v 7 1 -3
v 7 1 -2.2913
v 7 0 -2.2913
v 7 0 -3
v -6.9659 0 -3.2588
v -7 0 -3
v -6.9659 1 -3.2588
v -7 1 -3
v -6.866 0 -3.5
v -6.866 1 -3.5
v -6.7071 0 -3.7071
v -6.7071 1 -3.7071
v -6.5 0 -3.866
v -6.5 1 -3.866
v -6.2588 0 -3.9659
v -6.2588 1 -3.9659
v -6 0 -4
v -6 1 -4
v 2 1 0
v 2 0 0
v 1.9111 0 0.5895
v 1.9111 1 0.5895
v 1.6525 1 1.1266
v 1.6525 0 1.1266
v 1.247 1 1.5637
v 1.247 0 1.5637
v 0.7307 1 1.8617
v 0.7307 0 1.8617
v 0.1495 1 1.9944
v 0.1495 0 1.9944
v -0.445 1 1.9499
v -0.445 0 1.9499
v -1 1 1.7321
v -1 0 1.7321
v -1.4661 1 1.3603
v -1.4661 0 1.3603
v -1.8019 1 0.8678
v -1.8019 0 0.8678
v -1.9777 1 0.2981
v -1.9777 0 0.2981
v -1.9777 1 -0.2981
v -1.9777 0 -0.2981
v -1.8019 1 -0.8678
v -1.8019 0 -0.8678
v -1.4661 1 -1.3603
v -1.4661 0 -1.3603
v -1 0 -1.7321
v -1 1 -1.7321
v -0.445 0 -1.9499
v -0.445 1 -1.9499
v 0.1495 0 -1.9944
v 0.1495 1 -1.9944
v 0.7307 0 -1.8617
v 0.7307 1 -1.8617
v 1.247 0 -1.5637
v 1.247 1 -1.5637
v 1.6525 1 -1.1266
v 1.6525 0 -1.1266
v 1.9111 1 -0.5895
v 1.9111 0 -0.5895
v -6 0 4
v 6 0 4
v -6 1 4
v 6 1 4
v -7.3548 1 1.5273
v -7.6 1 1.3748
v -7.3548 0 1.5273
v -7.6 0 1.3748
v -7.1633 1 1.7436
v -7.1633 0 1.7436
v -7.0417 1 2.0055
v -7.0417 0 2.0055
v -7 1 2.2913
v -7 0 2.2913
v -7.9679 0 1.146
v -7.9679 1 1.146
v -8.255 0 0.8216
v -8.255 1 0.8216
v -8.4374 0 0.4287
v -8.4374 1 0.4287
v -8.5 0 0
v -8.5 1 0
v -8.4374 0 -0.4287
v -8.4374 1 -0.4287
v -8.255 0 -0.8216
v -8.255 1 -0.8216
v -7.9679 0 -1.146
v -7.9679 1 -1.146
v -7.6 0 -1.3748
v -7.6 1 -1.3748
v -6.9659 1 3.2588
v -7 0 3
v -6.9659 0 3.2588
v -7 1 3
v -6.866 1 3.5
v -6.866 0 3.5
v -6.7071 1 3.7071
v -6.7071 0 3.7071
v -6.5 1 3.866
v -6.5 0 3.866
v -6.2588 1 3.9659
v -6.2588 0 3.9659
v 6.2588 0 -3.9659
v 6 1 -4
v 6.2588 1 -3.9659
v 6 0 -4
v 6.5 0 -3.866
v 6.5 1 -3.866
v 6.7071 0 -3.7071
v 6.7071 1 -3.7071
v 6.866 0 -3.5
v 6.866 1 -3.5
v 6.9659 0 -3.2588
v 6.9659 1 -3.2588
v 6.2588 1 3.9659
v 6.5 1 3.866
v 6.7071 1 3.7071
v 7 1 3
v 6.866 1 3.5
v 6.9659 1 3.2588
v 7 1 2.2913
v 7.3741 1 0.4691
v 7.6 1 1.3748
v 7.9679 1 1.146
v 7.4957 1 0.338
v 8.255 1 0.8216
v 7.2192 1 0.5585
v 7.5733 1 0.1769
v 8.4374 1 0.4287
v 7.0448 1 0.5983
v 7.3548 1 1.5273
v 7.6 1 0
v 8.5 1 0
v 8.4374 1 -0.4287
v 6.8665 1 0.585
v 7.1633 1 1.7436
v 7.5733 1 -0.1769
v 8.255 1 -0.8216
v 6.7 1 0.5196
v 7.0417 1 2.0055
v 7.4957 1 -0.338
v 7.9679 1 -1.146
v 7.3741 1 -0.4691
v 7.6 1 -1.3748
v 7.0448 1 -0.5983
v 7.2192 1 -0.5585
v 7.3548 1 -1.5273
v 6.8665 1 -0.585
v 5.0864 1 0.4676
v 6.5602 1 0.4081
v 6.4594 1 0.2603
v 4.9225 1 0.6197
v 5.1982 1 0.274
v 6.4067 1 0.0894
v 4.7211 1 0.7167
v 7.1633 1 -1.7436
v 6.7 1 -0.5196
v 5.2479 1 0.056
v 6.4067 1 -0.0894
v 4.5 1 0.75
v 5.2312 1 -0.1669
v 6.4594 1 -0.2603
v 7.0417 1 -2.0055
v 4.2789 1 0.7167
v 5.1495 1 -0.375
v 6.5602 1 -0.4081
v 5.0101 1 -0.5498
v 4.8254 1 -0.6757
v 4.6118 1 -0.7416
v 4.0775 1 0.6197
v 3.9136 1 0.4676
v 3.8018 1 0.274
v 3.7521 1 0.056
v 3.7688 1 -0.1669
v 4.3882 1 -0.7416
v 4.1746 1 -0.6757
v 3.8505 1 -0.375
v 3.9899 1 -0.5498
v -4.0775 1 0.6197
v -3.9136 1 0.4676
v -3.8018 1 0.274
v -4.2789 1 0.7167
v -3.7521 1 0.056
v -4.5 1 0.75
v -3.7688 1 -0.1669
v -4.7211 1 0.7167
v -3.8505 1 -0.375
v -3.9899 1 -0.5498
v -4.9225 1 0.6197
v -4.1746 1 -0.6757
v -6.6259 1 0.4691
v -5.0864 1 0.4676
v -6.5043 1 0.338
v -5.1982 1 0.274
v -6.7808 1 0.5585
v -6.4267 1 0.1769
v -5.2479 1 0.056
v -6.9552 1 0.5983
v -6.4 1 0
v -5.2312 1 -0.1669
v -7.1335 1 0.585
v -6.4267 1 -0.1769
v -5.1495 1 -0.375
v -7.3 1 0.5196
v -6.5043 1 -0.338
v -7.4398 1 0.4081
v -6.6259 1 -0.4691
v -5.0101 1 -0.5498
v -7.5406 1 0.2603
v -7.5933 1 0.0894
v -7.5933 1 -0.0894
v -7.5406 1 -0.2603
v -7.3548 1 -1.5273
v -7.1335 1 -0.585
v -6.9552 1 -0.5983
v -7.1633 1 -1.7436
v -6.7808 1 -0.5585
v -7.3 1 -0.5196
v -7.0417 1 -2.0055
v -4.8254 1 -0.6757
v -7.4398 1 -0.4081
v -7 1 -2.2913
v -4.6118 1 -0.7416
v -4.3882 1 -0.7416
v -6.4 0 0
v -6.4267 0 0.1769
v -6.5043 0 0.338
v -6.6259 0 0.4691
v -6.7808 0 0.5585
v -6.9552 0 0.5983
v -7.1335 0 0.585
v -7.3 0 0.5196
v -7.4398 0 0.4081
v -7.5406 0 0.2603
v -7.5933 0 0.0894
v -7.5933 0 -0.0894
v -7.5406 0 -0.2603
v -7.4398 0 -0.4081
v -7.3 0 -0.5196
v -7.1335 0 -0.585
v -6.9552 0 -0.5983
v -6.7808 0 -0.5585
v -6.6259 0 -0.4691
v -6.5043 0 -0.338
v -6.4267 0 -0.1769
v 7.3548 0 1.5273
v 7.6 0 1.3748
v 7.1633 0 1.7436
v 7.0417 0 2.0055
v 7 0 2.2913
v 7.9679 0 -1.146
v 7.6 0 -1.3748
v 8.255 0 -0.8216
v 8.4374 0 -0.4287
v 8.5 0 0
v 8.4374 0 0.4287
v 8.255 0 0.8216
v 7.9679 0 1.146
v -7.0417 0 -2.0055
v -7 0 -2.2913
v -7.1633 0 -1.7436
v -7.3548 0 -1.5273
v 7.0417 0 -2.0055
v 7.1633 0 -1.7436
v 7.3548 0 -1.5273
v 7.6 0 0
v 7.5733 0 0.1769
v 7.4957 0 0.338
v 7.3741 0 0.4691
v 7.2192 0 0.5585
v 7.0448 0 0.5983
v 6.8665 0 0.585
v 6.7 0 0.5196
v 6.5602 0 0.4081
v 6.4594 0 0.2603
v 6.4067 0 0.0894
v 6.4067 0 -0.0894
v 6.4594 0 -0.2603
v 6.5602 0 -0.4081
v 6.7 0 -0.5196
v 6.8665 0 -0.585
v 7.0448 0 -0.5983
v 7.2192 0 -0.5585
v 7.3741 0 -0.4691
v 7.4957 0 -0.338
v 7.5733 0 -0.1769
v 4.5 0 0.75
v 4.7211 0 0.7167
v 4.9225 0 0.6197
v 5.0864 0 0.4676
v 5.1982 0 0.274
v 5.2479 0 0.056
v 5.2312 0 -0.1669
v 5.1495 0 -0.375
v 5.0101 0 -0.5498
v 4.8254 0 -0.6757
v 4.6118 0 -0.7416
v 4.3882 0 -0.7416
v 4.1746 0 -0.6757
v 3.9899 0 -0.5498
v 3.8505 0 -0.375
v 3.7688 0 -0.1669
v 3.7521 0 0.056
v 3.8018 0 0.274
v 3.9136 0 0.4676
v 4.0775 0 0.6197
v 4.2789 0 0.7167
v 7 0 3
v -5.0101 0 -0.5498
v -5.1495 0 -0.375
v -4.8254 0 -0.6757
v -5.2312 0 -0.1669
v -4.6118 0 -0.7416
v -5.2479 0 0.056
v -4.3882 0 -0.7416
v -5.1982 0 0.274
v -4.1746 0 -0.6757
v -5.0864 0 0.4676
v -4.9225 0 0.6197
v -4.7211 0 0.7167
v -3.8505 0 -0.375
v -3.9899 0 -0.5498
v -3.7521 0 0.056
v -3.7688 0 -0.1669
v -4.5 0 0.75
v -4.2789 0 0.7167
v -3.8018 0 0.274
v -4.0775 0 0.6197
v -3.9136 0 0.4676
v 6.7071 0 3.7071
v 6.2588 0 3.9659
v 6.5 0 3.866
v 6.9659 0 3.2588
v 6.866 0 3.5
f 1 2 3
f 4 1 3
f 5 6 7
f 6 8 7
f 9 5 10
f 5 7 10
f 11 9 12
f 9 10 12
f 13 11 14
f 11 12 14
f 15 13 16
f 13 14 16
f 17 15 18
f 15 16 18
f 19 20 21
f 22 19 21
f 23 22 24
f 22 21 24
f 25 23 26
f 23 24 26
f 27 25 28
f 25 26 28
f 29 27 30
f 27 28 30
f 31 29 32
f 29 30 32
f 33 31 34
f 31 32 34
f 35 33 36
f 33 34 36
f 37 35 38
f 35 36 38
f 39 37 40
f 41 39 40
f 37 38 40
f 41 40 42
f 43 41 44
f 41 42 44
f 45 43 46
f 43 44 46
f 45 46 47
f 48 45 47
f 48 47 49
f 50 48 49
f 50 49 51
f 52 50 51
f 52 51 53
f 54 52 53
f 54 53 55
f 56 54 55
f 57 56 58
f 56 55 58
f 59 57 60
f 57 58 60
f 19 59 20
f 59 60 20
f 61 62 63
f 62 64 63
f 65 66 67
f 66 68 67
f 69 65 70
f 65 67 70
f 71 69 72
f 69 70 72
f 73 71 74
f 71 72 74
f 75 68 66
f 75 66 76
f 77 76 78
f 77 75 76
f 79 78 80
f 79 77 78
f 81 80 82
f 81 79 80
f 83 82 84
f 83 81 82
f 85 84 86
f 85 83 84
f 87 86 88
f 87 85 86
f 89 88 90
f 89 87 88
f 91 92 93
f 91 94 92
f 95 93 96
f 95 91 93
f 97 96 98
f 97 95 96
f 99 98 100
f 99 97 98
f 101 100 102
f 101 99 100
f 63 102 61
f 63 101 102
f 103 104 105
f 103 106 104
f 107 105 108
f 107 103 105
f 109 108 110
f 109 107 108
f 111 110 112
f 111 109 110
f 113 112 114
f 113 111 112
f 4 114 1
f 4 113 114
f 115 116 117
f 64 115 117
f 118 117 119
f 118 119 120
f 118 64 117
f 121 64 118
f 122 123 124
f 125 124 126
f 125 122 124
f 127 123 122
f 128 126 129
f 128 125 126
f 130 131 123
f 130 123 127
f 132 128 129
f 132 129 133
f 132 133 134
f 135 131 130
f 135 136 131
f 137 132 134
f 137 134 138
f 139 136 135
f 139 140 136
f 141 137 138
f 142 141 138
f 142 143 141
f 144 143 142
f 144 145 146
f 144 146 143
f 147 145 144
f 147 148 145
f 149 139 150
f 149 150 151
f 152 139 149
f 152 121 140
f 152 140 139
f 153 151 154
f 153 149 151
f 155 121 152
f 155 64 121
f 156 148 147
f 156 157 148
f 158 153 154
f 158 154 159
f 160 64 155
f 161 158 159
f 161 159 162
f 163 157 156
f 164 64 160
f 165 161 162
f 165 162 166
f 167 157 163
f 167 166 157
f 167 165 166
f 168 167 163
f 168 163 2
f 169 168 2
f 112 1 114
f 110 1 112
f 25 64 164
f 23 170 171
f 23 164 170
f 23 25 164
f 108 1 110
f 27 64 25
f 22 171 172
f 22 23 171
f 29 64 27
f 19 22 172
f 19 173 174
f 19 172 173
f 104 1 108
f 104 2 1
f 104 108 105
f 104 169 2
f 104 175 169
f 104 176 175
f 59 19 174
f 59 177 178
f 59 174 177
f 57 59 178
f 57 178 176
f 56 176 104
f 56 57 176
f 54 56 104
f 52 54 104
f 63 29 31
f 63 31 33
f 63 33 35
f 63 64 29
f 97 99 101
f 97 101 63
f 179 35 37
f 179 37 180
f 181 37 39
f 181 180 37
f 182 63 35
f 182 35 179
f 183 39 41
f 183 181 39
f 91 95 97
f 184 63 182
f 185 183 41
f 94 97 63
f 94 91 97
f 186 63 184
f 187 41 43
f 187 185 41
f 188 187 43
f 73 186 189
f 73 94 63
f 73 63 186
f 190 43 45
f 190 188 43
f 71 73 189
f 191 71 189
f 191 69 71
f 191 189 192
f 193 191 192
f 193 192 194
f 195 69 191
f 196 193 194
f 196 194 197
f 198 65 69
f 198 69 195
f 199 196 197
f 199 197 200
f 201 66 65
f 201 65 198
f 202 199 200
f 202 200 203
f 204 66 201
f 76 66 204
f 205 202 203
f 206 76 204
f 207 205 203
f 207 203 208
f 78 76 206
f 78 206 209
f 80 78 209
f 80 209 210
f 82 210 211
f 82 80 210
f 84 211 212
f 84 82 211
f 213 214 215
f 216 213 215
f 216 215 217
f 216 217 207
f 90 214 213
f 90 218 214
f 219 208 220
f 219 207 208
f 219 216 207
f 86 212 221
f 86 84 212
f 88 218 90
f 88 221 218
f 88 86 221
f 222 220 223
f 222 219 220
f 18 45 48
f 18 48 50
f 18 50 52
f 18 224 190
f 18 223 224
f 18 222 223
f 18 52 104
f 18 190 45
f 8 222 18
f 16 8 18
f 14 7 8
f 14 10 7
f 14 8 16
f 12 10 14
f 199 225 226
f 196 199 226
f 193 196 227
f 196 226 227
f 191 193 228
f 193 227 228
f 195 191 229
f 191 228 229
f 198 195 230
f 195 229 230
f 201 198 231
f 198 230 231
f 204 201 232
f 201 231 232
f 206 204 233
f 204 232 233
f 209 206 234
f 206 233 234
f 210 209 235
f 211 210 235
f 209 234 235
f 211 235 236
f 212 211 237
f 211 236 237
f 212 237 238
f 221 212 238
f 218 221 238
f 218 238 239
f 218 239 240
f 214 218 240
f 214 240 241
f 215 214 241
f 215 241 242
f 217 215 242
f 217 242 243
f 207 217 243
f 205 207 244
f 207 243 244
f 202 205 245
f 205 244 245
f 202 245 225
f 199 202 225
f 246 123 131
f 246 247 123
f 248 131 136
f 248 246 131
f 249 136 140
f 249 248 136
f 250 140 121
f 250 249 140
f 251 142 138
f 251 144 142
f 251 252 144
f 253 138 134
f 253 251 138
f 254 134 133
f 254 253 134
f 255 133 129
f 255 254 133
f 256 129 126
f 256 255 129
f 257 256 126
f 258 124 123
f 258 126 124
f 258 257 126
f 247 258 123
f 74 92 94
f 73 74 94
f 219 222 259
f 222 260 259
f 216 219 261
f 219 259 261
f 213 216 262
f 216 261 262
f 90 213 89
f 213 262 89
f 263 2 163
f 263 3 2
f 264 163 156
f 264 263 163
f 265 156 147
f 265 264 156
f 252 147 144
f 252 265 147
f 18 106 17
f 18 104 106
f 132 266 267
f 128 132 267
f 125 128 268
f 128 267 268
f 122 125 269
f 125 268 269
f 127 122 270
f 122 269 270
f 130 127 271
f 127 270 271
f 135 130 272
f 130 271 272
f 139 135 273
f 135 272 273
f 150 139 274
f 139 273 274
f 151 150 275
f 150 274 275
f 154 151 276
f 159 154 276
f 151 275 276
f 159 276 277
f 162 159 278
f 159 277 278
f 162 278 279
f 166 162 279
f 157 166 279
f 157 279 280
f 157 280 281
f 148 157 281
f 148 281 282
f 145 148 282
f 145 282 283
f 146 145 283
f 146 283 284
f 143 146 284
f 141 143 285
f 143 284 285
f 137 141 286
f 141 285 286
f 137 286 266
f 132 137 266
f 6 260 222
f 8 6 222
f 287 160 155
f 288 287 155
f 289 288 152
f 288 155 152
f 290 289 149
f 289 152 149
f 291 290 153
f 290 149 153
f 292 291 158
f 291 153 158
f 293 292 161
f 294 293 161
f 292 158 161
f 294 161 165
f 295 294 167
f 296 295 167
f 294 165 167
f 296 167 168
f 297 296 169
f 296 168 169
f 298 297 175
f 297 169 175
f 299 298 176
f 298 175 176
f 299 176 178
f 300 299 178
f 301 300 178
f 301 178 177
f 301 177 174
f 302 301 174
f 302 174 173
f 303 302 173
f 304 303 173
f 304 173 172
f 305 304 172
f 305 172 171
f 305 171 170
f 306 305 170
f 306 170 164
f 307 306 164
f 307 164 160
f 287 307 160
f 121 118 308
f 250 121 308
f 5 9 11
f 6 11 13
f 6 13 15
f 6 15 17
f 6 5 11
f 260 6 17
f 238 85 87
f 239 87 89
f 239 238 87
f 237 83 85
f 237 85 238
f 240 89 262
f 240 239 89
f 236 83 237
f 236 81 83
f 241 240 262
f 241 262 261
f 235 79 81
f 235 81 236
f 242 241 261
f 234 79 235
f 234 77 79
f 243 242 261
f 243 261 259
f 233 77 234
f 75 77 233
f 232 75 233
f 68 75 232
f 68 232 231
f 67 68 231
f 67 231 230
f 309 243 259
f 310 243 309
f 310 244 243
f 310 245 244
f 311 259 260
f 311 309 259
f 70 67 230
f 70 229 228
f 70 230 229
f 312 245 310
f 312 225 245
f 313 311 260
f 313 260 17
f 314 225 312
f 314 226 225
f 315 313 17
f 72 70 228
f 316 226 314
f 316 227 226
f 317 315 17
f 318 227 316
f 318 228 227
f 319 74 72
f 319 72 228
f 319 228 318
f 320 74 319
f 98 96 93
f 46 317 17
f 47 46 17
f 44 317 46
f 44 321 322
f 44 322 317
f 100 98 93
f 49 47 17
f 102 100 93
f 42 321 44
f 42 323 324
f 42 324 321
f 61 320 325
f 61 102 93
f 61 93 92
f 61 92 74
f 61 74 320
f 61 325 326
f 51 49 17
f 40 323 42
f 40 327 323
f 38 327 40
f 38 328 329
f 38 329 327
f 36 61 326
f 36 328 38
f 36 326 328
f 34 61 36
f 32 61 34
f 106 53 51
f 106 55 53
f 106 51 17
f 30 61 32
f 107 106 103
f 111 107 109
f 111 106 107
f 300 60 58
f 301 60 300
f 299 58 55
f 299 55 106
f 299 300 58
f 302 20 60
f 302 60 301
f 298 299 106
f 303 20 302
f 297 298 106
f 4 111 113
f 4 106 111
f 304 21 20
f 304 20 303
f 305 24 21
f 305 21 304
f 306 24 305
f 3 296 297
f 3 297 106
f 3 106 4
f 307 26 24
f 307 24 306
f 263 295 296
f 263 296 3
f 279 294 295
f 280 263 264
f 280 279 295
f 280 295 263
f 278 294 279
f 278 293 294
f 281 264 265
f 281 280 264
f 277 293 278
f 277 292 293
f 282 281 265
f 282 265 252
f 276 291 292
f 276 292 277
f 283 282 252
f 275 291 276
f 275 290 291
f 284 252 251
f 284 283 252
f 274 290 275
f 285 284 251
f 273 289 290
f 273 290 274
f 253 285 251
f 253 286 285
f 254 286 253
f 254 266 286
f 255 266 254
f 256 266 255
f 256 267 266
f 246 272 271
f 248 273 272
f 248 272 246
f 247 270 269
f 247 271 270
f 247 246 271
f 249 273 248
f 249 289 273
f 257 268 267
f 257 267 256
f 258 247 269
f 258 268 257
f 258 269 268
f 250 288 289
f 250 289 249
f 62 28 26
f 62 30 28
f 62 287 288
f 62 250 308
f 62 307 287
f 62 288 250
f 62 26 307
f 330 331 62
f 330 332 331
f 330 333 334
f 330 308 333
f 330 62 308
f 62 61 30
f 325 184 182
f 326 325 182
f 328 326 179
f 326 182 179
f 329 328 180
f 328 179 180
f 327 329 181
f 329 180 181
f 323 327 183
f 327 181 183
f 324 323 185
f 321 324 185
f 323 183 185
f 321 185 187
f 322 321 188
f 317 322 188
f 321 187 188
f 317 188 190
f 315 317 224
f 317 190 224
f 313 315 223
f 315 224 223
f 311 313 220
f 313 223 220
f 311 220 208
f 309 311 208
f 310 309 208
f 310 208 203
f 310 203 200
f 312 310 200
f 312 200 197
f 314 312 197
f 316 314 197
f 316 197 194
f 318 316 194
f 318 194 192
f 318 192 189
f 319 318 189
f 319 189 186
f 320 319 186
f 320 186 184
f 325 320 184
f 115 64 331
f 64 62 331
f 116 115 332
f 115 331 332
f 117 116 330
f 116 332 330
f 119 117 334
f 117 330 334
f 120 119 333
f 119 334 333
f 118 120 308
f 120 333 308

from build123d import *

# Parameters (mm, degrees)
EXTRUDE1_DEPTH      = 4
EXTRUDE2_DEPTH      = 12.357816692
EXTRUDE2_DEPTH_BACK = 12.357816692
SKETCH2_R           = 1
EXTRUDE3_DEPTH      = 12.357816692
EXTRUDE3_DEPTH_BACK = 12.357816692
SKETCH4_W           = 6
SKETCH4_H           = 8.732029078
FILLET2_R           = 1
EXTRUDE4_DEPTH      = 14
EXTRUDE4_DEPTH_BACK = 3
SKETCH3_R           = 1.5
EXTRUDE5_DEPTH      = 9
SKETCH6_R           = 1.5
EXTRUDE6_DEPTH      = 1
SKETCH7_R           = 0.6
EXTRUDE7_DEPTH      = 1
FILLET3_R           = 1
SKETCH8_R           = 2
EXTRUDE8_DEPTH      = 1
SKETCH9_R           = 15.158662045
EXTRUDE9_DEPTH      = 18.811513131
SKETCH_2_R          = 0.75
CUT_EXTRUDE_1_DEPTH = 10.447221814
FILLET_1_R          = 1


with BuildPart() as part:
    # Sketch1 → Extrude1 (new, symmetric)
    with BuildSketch(Plane.XY):
        Polygon((0, 0), (-7, 0), (-7, 8), (7, 8), (7, 0), align=None)
    extrude(amount=EXTRUDE1_DEPTH, both=True)

    # Sketch2 → Extrude2 (cut, two sides: drawn at the far end of the back side and taken through both)
    with BuildSketch(Plane.XY.offset(-EXTRUDE2_DEPTH_BACK)):
        with Locations((4.5, 5.5)):
            Circle(SKETCH2_R)
    extrude(amount=EXTRUDE2_DEPTH + EXTRUDE2_DEPTH_BACK, mode=Mode.SUBTRACT)

    # Sketch4 → Extrude3 (cut, two sides: drawn at the far end of the back side and taken through both)
    with BuildSketch(Plane(origin=(0, 0, 0), x_dir=(0, 0, -1), z_dir=(1, 0, 0)).offset(-EXTRUDE3_DEPTH_BACK)):
        with Locations((0, 5.366014539)):
            Rectangle(SKETCH4_W, SKETCH4_H)
    extrude(amount=EXTRUDE3_DEPTH + EXTRUDE3_DEPTH_BACK, mode=Mode.SUBTRACT)

    # Fillet2
    fillet2_edges = [part.edges().sort_by_distance(p)[0] for p in [
        (-7, 8, -3.5),
        (7, 8, -3.5),
        (-7, 8, 3.5),
        (7, 8, 3.5),
    ]]
    fillet(fillet2_edges, radius=FILLET2_R)

    # Sketch3 → Extrude4 (add, two sides: drawn at the far end of the back side and taken through both)
    with BuildSketch(Plane.XY.offset(-EXTRUDE4_DEPTH_BACK)):
        with Locations((-3, 4.5)):
            Circle(SKETCH3_R)
    extrude(amount=EXTRUDE4_DEPTH + EXTRUDE4_DEPTH_BACK)

    # Sketch5 → Extrude5 (cut)
    with BuildSketch(Plane.XY.offset(14)):
        Polygon((-4, 4.5), (-4, 6.060686456), (-4.95644391, 6.060686456), (-4.95644391, 2.5), (-4, 2.5), align=None)
    extrude(amount=-EXTRUDE5_DEPTH, mode=Mode.SUBTRACT)

    # Sketch6 → Extrude6 (add)
    with BuildSketch(Plane.XZ):
        with Locations((-7, 0)):
            Circle(SKETCH6_R)
        with Locations((7, 0)):
            Circle(SKETCH6_R)
    extrude(amount=-EXTRUDE6_DEPTH)

    # Sketch7 → Extrude7 (cut)
    with BuildSketch(Plane.XZ):
        with Locations((-7, 0)):
            Circle(SKETCH7_R)
        with Locations((7, 0)):
            Circle(SKETCH7_R)
    extrude(amount=-EXTRUDE7_DEPTH, mode=Mode.SUBTRACT)

    # Fillet3
    fillet3_edges = [part.edges().sort_by_distance(p)[0] for p in [
        (7, 0.5, -1.5),
        (7, 0.5, 1.5),
        (-7, 0.5, 1.5),
        (-7, 0.5, -1.5),
    ]]
    fillet(fillet3_edges, radius=FILLET3_R)

    # Sketch8 → Extrude8 (cut)
    with BuildSketch(Plane.XZ):
        Circle(SKETCH8_R)
    extrude(amount=-EXTRUDE8_DEPTH, mode=Mode.SUBTRACT)

    # Sketch9 → Extrude9 (cut, through all)
    with BuildSketch(Plane(origin=(0, 1, 0), x_dir=(1, 0, 0), z_dir=(0, 1, 0))):
        Circle(SKETCH9_R)
    extrude(amount=EXTRUDE9_DEPTH, mode=Mode.SUBTRACT)

    # Эскиз2 → Вырез-Вытянуть1 (cut, through all)
    with BuildSketch(Plane(origin=(0, 1, 0), x_dir=(1, 0, 0), z_dir=(0, 1, 0))):
        with Locations(Location((-4.5, 0, 0), (0, 0, 270))):
            Circle(SKETCH_2_R)
        with Locations(Location((4.5, 0, 0), (0, 0, 270))):
            Circle(SKETCH_2_R)
    extrude(amount=-CUT_EXTRUDE_1_DEPTH, mode=Mode.SUBTRACT)

    # Скругление1
    fillet_1_edges = [part.edges().sort_by_distance(p)[0] for p in [
        (-7, 0.5, -4),
        (-7, 0.5, 4),
        (7, 0.5, -4),
        (7, 0.5, 4),
    ]]
    fillet(fillet_1_edges, radius=FILLET_1_R)


solid = part.part
